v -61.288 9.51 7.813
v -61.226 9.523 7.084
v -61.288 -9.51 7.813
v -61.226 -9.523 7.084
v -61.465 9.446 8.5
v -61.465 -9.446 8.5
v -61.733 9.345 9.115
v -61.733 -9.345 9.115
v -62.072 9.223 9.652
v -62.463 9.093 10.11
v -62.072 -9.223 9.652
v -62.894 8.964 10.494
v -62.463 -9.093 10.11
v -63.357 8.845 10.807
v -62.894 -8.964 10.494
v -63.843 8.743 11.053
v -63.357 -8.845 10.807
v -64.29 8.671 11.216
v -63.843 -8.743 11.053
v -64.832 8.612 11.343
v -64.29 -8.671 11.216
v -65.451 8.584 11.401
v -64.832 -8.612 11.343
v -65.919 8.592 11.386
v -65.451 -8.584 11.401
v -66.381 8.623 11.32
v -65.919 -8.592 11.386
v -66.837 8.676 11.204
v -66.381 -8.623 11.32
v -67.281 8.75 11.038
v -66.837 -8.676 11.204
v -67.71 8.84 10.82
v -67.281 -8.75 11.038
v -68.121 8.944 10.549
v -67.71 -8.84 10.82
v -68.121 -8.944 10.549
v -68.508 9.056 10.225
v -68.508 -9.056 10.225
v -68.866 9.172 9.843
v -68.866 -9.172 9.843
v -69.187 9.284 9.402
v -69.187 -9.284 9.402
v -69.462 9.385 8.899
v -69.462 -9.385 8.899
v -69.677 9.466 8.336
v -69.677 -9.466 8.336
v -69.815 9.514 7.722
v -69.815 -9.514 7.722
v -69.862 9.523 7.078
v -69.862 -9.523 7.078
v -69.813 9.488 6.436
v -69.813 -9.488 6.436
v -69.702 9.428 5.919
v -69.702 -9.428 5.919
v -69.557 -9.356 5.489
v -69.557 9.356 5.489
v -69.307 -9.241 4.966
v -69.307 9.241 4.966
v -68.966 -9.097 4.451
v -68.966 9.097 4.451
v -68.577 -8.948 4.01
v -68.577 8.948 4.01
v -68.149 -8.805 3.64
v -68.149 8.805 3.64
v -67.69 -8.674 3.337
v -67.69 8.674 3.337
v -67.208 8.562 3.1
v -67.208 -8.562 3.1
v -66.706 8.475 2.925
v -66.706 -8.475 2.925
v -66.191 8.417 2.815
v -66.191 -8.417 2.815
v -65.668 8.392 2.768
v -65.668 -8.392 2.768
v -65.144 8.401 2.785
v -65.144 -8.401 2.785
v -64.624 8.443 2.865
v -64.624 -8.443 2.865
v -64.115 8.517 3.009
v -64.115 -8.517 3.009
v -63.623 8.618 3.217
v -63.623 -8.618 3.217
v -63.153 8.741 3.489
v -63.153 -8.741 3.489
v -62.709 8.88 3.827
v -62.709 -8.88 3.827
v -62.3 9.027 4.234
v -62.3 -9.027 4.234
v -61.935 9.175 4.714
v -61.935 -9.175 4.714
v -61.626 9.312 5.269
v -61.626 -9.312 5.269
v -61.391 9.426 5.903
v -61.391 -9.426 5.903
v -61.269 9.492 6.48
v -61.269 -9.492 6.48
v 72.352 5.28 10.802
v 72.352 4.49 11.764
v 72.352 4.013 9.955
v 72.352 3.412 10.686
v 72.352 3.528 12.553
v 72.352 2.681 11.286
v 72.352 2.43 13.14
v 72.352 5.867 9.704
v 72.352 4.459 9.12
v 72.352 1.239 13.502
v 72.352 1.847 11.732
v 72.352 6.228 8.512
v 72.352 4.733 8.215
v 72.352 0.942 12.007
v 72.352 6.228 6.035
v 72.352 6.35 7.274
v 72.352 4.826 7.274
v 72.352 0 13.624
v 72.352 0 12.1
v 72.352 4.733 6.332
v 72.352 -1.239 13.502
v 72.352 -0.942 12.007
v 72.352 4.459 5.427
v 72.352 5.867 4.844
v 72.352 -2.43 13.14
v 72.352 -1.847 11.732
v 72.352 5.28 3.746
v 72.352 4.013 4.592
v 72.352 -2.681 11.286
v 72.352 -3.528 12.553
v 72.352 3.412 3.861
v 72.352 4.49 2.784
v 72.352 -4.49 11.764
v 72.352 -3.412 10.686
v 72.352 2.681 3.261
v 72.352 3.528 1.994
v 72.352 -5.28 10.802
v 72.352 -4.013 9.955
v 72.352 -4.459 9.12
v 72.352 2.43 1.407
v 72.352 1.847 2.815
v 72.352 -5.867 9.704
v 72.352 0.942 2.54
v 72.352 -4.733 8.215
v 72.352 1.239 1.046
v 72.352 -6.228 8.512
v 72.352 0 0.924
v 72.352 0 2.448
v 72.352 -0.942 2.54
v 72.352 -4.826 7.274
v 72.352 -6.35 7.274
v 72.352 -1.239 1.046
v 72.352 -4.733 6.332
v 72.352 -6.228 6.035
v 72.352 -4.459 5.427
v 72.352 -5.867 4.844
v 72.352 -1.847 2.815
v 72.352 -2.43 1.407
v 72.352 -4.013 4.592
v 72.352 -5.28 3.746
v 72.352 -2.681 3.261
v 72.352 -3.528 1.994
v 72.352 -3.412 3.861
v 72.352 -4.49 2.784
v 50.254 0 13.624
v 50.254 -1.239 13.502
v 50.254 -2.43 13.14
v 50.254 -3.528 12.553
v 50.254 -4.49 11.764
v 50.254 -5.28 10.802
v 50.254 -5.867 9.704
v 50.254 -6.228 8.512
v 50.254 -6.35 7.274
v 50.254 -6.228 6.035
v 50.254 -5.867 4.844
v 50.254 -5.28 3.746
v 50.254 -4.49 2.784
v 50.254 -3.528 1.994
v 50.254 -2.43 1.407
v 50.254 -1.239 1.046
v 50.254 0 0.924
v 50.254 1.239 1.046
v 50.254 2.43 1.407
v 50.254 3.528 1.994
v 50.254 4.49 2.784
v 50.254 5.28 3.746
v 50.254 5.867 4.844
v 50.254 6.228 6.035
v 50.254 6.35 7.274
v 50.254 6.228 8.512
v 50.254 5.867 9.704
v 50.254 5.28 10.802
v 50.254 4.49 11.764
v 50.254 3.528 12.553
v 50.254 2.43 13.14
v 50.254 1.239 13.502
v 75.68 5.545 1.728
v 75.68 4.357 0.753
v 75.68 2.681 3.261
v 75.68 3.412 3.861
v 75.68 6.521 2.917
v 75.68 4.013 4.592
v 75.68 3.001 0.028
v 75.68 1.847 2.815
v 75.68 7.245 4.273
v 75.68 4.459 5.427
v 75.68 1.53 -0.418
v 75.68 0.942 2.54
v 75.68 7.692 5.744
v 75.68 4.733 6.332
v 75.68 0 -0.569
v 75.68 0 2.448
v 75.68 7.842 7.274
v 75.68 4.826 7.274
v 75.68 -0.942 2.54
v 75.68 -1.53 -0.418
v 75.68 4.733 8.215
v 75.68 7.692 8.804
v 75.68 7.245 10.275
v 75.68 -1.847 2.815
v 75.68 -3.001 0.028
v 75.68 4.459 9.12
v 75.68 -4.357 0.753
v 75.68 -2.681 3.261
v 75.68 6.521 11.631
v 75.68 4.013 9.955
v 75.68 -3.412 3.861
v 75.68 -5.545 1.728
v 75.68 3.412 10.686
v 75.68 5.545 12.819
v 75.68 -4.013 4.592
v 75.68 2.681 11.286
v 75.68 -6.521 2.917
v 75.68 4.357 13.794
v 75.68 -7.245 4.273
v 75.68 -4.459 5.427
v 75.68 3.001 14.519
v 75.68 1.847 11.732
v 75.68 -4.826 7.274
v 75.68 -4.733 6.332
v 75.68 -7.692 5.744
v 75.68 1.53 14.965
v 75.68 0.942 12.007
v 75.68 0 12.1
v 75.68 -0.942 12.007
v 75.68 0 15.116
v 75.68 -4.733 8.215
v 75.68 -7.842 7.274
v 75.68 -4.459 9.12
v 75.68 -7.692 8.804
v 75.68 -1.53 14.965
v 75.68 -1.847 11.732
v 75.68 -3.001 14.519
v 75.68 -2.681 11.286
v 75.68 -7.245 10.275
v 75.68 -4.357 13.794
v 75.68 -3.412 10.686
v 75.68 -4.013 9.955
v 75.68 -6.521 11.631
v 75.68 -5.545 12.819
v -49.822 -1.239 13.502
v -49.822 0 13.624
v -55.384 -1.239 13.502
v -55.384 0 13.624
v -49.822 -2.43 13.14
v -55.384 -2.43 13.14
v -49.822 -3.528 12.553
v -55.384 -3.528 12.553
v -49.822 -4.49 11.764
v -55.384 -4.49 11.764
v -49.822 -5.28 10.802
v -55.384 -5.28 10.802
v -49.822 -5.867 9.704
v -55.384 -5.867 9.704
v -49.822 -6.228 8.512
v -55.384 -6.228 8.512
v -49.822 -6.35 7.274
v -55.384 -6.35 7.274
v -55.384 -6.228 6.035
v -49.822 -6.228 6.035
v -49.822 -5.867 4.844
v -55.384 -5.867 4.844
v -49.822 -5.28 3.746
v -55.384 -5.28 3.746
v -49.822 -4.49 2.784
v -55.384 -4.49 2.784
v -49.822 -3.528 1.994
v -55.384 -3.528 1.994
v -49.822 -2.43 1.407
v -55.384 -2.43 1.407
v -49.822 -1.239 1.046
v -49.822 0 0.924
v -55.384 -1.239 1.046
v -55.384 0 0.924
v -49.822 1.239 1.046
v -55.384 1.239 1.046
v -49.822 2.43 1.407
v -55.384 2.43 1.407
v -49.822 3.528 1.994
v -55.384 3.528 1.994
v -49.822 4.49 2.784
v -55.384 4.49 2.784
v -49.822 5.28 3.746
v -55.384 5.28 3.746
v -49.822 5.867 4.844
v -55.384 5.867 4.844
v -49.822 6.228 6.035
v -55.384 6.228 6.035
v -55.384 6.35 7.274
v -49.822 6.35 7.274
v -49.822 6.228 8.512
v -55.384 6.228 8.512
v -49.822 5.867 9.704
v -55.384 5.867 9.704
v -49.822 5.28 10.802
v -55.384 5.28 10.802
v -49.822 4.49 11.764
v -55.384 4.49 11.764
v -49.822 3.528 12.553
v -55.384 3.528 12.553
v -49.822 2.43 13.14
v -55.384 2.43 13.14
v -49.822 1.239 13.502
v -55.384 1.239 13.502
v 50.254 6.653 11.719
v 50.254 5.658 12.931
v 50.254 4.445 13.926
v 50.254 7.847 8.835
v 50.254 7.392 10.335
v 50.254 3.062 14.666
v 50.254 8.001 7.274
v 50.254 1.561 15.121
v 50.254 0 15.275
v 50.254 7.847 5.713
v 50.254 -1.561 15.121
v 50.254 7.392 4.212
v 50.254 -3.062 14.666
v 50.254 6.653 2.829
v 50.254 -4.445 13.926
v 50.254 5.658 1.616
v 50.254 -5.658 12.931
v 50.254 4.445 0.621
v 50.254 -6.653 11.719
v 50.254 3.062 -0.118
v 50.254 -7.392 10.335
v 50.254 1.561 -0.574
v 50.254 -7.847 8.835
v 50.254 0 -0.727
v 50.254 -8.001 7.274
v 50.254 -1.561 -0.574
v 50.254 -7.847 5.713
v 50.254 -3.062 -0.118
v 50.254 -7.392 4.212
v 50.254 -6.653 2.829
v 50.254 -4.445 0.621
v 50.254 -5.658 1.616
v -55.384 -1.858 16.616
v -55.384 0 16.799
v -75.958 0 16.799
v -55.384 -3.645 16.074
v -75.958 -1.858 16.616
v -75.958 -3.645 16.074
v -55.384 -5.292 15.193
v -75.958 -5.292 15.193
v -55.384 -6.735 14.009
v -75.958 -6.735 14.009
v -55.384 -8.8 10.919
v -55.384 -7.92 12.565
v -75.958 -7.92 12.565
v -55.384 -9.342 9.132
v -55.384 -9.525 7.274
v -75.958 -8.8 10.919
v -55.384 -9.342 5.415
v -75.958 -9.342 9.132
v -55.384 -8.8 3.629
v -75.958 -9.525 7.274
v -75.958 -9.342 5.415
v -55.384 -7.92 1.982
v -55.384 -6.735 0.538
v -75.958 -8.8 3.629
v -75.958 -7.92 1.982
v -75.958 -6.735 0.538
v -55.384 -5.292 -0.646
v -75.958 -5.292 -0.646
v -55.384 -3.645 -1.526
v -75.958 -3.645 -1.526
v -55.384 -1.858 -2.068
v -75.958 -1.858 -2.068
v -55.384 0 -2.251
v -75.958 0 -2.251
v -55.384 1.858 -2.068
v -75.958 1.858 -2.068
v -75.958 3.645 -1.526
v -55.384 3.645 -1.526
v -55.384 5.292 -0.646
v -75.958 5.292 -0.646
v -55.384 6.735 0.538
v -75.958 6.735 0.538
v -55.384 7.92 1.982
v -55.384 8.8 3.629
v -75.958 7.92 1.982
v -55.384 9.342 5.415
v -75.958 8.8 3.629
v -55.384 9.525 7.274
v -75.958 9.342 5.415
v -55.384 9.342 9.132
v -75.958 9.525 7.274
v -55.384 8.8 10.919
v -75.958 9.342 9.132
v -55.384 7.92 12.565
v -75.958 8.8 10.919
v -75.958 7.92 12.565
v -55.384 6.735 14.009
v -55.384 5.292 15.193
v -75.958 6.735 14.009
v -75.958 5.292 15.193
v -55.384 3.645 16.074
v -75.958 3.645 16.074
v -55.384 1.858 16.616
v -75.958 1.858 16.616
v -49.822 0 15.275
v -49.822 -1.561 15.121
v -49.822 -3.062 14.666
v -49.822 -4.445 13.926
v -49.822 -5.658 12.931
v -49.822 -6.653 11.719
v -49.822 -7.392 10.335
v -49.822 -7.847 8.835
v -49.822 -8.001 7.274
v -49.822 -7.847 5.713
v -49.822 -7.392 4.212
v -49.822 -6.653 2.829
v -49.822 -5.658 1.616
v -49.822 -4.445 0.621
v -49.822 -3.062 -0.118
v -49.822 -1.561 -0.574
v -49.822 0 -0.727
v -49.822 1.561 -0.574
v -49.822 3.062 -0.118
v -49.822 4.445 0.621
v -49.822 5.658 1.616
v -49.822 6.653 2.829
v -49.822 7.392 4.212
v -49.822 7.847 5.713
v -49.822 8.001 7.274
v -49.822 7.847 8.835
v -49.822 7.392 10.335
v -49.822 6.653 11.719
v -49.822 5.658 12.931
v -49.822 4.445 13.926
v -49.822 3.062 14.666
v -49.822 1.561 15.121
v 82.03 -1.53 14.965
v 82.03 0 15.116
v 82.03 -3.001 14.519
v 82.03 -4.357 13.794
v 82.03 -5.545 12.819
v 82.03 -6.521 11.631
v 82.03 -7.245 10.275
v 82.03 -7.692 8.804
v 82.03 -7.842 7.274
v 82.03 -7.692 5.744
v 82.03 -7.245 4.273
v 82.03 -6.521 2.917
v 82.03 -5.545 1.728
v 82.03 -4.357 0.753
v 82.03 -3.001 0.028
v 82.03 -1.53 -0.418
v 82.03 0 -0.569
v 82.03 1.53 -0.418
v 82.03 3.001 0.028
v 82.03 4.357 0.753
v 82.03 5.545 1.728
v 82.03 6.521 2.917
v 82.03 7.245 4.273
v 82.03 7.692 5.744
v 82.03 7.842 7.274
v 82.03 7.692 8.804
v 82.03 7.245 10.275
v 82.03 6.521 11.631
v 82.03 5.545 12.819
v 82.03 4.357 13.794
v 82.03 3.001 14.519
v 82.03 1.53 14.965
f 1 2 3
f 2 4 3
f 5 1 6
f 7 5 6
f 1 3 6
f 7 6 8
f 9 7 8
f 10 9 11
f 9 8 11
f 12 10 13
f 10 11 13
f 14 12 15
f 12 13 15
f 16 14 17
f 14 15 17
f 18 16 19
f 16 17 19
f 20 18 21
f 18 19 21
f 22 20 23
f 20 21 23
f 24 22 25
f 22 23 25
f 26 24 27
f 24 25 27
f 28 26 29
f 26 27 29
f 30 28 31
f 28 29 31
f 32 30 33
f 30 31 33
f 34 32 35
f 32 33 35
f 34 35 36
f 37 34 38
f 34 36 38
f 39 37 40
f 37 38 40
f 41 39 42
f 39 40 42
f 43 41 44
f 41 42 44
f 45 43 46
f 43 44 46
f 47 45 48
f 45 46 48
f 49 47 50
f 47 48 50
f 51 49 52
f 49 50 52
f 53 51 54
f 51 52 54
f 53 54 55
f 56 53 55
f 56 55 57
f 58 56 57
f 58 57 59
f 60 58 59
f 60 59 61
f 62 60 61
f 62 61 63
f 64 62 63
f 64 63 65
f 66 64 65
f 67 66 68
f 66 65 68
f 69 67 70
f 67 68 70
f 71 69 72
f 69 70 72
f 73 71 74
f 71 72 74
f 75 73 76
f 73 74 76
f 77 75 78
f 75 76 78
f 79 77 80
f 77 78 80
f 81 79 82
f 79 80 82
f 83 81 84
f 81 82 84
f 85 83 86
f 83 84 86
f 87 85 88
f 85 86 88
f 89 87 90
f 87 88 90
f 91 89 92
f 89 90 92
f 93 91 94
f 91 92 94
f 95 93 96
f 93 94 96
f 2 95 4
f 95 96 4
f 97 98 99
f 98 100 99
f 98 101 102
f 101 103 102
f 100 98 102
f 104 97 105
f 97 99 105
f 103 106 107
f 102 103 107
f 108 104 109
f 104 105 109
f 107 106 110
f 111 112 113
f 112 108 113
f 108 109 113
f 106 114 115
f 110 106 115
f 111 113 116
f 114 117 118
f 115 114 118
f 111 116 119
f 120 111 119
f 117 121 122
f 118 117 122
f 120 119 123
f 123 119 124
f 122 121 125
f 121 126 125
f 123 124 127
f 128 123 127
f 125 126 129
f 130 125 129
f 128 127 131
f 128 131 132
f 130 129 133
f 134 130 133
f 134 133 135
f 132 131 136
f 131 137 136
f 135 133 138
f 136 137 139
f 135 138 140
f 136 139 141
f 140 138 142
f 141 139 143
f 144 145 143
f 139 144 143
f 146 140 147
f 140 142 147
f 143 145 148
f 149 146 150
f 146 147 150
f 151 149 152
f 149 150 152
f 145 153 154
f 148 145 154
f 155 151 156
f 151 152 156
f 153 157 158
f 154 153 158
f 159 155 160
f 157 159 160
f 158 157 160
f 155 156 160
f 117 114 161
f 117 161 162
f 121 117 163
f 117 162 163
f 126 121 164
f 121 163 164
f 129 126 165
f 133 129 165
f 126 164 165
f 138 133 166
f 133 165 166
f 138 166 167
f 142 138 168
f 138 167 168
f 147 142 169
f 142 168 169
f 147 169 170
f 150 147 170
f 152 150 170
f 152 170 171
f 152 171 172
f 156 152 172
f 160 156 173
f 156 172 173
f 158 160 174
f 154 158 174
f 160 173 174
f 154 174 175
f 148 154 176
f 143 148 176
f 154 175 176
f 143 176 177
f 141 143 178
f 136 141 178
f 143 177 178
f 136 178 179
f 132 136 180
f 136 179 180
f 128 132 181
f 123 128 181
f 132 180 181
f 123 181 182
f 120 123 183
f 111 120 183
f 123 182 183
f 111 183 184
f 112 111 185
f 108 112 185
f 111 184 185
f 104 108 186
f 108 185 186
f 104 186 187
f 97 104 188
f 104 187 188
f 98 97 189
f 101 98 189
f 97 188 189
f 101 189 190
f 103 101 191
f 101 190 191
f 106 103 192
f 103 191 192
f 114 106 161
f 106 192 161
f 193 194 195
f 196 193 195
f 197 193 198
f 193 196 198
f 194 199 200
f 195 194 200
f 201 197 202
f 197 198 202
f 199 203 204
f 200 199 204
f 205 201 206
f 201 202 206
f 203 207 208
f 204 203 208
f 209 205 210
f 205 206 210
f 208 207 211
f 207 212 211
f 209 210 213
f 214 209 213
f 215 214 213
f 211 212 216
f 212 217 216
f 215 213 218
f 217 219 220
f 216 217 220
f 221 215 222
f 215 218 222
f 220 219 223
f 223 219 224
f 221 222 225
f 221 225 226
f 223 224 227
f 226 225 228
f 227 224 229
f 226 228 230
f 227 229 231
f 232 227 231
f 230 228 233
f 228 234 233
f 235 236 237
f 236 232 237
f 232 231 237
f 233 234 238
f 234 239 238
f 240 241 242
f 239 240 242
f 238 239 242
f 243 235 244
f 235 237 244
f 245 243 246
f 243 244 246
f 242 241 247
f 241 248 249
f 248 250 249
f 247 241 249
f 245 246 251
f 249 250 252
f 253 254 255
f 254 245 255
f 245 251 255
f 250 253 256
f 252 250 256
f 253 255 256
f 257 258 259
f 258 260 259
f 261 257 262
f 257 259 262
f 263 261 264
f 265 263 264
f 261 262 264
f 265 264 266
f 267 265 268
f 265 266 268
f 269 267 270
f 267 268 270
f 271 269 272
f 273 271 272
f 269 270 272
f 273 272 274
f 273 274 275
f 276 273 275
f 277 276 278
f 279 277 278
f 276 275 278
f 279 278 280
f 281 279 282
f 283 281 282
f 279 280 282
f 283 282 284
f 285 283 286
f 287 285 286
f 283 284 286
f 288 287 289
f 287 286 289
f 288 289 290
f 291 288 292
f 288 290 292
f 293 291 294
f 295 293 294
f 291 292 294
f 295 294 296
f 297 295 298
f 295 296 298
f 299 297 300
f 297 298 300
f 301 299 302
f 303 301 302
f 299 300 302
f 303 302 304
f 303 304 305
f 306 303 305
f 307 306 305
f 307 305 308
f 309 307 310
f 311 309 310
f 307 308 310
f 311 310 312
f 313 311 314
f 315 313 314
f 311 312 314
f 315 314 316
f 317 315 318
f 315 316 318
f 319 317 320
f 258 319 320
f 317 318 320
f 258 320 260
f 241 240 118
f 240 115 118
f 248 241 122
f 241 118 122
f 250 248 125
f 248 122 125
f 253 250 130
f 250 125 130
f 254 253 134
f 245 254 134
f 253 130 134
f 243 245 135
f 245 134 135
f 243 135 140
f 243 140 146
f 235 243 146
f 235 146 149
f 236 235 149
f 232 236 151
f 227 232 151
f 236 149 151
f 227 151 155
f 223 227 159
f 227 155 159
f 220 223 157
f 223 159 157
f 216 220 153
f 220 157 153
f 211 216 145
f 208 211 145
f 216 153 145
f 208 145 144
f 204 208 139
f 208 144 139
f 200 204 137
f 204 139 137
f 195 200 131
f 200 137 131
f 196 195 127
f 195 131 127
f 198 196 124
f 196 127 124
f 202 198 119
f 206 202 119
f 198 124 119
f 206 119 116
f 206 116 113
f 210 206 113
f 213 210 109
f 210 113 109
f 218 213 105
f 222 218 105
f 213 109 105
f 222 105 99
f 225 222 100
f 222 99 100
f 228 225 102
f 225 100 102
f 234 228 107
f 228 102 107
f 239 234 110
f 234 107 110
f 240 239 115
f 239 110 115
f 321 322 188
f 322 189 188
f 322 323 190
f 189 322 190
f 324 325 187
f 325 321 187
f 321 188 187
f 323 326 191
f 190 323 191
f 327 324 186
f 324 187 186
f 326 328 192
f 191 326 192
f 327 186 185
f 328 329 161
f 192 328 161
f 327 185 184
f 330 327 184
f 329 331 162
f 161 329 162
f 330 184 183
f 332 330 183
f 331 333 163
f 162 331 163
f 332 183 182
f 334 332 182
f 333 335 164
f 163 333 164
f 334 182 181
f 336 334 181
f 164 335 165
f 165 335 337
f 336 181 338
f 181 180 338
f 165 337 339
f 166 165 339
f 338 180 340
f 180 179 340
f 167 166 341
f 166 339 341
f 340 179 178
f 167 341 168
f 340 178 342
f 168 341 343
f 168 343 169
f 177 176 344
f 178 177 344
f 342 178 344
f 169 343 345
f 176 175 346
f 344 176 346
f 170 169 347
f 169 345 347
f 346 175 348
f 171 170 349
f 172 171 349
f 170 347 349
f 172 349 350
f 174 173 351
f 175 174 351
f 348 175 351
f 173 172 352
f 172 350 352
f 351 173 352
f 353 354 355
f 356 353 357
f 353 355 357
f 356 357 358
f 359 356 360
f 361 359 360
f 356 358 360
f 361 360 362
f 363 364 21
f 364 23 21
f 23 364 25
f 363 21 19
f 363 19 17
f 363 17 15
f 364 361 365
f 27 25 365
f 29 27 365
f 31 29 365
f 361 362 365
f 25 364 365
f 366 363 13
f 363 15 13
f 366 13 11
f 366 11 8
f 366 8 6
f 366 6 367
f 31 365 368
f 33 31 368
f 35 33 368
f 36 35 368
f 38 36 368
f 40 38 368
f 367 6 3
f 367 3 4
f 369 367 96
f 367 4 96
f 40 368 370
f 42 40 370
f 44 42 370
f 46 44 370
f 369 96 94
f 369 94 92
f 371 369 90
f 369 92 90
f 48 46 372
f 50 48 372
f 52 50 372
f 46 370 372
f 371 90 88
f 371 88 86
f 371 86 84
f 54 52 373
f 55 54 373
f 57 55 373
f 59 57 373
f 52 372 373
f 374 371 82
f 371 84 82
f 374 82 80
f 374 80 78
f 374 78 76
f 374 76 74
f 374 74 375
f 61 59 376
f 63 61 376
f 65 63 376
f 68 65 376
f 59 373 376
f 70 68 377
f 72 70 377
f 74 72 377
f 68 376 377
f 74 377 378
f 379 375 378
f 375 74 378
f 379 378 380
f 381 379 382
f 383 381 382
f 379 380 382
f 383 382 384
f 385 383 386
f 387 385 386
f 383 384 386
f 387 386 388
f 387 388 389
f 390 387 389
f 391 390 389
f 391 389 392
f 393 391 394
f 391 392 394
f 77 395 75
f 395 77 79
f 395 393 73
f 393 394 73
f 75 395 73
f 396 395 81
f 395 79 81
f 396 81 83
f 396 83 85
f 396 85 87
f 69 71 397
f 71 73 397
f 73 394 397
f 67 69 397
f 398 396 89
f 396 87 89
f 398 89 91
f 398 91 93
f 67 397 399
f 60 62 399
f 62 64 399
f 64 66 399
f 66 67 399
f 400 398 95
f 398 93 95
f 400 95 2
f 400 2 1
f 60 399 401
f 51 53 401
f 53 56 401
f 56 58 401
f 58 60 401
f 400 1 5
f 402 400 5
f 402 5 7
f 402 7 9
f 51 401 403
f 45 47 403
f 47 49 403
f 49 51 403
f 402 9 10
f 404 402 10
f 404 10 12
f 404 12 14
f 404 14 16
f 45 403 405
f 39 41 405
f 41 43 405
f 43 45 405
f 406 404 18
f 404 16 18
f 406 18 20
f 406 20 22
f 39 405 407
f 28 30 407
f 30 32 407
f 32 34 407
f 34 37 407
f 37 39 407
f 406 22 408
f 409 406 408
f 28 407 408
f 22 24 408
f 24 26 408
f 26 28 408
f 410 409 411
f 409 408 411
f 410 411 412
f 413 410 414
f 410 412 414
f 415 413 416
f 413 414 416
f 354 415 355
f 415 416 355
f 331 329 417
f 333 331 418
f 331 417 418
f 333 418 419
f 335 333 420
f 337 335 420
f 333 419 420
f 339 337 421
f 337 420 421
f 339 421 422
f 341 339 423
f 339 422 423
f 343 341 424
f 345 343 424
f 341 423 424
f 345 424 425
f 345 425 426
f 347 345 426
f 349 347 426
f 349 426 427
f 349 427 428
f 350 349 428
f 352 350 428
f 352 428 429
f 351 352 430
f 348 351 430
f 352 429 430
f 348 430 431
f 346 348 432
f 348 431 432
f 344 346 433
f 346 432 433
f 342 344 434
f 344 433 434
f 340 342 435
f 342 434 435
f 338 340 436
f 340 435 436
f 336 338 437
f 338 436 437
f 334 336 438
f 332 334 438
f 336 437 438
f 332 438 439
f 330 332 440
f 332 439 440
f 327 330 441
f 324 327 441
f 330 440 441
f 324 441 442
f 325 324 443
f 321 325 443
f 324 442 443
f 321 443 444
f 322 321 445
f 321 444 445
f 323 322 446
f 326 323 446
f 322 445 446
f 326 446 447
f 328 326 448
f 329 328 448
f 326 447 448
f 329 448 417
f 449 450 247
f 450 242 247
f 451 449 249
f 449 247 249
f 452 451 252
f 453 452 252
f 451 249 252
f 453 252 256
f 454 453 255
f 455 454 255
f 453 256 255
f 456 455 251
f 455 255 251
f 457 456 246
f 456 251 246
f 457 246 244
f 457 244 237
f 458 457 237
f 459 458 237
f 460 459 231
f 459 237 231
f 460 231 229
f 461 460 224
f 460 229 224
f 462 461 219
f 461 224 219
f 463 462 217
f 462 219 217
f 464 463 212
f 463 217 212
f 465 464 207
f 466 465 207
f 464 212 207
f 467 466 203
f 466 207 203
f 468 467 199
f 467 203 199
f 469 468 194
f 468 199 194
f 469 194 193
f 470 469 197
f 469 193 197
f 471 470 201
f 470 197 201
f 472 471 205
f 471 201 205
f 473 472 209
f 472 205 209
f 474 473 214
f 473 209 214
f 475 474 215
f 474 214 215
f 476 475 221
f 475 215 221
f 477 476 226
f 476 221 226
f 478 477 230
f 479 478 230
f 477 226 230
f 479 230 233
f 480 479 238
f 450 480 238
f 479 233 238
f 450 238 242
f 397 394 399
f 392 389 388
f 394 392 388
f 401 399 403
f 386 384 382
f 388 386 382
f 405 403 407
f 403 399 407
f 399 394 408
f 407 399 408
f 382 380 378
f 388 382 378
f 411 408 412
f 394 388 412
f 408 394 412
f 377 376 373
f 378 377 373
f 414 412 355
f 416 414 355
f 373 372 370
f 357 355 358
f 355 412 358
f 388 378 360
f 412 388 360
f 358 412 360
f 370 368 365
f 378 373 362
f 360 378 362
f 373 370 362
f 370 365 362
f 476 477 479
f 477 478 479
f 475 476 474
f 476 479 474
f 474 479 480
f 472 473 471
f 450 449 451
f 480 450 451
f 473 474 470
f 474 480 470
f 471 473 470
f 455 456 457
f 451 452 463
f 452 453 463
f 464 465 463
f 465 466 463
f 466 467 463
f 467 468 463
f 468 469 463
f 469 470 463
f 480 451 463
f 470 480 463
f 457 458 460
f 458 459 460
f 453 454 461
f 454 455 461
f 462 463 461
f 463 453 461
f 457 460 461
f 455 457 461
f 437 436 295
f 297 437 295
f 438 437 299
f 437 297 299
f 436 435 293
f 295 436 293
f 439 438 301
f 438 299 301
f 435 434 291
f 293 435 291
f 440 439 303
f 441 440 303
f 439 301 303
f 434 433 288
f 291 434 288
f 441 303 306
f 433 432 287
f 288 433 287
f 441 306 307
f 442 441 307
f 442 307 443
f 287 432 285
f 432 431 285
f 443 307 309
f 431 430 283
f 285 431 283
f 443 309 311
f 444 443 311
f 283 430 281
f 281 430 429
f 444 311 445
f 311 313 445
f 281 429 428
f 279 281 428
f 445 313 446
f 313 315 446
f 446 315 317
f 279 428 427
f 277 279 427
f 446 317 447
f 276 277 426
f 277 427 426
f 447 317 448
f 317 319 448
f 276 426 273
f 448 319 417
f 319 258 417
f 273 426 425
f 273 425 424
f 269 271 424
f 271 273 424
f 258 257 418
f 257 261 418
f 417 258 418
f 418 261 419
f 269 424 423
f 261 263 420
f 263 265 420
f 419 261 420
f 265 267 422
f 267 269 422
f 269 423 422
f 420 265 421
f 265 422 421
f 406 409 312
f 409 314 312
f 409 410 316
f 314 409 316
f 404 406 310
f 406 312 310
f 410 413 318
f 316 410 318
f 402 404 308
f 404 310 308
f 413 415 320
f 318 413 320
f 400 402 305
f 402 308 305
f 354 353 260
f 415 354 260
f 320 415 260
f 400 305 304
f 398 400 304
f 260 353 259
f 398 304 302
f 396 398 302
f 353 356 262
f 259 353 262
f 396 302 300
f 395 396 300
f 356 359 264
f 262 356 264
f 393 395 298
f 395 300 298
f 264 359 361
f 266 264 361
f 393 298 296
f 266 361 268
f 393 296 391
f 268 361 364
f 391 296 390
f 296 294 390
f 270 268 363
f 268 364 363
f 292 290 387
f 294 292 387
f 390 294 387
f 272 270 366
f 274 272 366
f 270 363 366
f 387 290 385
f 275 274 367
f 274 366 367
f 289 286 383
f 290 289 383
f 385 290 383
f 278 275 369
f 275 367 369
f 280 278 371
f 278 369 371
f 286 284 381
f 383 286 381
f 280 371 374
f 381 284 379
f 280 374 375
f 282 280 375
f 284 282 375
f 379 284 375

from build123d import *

# Parameters (mm, degrees)
F2_R     = 4.318
F3_DEPTH = 127


with BuildPart() as f1:
    # F0 (on Front) → F1 (revolve)
    with BuildSketch(Plane.XZ):
        Polygon((-75.958224, 16.798637), (-75.958224, 7.273637), (82.029776, 7.273637), (82.029776, 15.115878), (75.679776, 15.115878), (75.679776, 12.099637), (72.352376, 12.099637), (72.352376, 13.623637), (50.254376, 13.623637), (50.254376, 15.274637), (-49.821624, 15.274637), (-49.821624, 13.623637), (-55.384224, 13.623637), (-55.384224, 16.798637), align=None)
    revolve(axis=Axis((3.035776, 0, 7.273637), (1, 0, 0)))

    # F2 (on Front) → F3 (cut, symmetric)
    with BuildSketch(Plane.XZ):
        with Locations((-65.544224, 7.084235)):
            Circle(F2_R)
    extrude(amount=F3_DEPTH, both=True, mode=Mode.SUBTRACT)


solid = f1.part
